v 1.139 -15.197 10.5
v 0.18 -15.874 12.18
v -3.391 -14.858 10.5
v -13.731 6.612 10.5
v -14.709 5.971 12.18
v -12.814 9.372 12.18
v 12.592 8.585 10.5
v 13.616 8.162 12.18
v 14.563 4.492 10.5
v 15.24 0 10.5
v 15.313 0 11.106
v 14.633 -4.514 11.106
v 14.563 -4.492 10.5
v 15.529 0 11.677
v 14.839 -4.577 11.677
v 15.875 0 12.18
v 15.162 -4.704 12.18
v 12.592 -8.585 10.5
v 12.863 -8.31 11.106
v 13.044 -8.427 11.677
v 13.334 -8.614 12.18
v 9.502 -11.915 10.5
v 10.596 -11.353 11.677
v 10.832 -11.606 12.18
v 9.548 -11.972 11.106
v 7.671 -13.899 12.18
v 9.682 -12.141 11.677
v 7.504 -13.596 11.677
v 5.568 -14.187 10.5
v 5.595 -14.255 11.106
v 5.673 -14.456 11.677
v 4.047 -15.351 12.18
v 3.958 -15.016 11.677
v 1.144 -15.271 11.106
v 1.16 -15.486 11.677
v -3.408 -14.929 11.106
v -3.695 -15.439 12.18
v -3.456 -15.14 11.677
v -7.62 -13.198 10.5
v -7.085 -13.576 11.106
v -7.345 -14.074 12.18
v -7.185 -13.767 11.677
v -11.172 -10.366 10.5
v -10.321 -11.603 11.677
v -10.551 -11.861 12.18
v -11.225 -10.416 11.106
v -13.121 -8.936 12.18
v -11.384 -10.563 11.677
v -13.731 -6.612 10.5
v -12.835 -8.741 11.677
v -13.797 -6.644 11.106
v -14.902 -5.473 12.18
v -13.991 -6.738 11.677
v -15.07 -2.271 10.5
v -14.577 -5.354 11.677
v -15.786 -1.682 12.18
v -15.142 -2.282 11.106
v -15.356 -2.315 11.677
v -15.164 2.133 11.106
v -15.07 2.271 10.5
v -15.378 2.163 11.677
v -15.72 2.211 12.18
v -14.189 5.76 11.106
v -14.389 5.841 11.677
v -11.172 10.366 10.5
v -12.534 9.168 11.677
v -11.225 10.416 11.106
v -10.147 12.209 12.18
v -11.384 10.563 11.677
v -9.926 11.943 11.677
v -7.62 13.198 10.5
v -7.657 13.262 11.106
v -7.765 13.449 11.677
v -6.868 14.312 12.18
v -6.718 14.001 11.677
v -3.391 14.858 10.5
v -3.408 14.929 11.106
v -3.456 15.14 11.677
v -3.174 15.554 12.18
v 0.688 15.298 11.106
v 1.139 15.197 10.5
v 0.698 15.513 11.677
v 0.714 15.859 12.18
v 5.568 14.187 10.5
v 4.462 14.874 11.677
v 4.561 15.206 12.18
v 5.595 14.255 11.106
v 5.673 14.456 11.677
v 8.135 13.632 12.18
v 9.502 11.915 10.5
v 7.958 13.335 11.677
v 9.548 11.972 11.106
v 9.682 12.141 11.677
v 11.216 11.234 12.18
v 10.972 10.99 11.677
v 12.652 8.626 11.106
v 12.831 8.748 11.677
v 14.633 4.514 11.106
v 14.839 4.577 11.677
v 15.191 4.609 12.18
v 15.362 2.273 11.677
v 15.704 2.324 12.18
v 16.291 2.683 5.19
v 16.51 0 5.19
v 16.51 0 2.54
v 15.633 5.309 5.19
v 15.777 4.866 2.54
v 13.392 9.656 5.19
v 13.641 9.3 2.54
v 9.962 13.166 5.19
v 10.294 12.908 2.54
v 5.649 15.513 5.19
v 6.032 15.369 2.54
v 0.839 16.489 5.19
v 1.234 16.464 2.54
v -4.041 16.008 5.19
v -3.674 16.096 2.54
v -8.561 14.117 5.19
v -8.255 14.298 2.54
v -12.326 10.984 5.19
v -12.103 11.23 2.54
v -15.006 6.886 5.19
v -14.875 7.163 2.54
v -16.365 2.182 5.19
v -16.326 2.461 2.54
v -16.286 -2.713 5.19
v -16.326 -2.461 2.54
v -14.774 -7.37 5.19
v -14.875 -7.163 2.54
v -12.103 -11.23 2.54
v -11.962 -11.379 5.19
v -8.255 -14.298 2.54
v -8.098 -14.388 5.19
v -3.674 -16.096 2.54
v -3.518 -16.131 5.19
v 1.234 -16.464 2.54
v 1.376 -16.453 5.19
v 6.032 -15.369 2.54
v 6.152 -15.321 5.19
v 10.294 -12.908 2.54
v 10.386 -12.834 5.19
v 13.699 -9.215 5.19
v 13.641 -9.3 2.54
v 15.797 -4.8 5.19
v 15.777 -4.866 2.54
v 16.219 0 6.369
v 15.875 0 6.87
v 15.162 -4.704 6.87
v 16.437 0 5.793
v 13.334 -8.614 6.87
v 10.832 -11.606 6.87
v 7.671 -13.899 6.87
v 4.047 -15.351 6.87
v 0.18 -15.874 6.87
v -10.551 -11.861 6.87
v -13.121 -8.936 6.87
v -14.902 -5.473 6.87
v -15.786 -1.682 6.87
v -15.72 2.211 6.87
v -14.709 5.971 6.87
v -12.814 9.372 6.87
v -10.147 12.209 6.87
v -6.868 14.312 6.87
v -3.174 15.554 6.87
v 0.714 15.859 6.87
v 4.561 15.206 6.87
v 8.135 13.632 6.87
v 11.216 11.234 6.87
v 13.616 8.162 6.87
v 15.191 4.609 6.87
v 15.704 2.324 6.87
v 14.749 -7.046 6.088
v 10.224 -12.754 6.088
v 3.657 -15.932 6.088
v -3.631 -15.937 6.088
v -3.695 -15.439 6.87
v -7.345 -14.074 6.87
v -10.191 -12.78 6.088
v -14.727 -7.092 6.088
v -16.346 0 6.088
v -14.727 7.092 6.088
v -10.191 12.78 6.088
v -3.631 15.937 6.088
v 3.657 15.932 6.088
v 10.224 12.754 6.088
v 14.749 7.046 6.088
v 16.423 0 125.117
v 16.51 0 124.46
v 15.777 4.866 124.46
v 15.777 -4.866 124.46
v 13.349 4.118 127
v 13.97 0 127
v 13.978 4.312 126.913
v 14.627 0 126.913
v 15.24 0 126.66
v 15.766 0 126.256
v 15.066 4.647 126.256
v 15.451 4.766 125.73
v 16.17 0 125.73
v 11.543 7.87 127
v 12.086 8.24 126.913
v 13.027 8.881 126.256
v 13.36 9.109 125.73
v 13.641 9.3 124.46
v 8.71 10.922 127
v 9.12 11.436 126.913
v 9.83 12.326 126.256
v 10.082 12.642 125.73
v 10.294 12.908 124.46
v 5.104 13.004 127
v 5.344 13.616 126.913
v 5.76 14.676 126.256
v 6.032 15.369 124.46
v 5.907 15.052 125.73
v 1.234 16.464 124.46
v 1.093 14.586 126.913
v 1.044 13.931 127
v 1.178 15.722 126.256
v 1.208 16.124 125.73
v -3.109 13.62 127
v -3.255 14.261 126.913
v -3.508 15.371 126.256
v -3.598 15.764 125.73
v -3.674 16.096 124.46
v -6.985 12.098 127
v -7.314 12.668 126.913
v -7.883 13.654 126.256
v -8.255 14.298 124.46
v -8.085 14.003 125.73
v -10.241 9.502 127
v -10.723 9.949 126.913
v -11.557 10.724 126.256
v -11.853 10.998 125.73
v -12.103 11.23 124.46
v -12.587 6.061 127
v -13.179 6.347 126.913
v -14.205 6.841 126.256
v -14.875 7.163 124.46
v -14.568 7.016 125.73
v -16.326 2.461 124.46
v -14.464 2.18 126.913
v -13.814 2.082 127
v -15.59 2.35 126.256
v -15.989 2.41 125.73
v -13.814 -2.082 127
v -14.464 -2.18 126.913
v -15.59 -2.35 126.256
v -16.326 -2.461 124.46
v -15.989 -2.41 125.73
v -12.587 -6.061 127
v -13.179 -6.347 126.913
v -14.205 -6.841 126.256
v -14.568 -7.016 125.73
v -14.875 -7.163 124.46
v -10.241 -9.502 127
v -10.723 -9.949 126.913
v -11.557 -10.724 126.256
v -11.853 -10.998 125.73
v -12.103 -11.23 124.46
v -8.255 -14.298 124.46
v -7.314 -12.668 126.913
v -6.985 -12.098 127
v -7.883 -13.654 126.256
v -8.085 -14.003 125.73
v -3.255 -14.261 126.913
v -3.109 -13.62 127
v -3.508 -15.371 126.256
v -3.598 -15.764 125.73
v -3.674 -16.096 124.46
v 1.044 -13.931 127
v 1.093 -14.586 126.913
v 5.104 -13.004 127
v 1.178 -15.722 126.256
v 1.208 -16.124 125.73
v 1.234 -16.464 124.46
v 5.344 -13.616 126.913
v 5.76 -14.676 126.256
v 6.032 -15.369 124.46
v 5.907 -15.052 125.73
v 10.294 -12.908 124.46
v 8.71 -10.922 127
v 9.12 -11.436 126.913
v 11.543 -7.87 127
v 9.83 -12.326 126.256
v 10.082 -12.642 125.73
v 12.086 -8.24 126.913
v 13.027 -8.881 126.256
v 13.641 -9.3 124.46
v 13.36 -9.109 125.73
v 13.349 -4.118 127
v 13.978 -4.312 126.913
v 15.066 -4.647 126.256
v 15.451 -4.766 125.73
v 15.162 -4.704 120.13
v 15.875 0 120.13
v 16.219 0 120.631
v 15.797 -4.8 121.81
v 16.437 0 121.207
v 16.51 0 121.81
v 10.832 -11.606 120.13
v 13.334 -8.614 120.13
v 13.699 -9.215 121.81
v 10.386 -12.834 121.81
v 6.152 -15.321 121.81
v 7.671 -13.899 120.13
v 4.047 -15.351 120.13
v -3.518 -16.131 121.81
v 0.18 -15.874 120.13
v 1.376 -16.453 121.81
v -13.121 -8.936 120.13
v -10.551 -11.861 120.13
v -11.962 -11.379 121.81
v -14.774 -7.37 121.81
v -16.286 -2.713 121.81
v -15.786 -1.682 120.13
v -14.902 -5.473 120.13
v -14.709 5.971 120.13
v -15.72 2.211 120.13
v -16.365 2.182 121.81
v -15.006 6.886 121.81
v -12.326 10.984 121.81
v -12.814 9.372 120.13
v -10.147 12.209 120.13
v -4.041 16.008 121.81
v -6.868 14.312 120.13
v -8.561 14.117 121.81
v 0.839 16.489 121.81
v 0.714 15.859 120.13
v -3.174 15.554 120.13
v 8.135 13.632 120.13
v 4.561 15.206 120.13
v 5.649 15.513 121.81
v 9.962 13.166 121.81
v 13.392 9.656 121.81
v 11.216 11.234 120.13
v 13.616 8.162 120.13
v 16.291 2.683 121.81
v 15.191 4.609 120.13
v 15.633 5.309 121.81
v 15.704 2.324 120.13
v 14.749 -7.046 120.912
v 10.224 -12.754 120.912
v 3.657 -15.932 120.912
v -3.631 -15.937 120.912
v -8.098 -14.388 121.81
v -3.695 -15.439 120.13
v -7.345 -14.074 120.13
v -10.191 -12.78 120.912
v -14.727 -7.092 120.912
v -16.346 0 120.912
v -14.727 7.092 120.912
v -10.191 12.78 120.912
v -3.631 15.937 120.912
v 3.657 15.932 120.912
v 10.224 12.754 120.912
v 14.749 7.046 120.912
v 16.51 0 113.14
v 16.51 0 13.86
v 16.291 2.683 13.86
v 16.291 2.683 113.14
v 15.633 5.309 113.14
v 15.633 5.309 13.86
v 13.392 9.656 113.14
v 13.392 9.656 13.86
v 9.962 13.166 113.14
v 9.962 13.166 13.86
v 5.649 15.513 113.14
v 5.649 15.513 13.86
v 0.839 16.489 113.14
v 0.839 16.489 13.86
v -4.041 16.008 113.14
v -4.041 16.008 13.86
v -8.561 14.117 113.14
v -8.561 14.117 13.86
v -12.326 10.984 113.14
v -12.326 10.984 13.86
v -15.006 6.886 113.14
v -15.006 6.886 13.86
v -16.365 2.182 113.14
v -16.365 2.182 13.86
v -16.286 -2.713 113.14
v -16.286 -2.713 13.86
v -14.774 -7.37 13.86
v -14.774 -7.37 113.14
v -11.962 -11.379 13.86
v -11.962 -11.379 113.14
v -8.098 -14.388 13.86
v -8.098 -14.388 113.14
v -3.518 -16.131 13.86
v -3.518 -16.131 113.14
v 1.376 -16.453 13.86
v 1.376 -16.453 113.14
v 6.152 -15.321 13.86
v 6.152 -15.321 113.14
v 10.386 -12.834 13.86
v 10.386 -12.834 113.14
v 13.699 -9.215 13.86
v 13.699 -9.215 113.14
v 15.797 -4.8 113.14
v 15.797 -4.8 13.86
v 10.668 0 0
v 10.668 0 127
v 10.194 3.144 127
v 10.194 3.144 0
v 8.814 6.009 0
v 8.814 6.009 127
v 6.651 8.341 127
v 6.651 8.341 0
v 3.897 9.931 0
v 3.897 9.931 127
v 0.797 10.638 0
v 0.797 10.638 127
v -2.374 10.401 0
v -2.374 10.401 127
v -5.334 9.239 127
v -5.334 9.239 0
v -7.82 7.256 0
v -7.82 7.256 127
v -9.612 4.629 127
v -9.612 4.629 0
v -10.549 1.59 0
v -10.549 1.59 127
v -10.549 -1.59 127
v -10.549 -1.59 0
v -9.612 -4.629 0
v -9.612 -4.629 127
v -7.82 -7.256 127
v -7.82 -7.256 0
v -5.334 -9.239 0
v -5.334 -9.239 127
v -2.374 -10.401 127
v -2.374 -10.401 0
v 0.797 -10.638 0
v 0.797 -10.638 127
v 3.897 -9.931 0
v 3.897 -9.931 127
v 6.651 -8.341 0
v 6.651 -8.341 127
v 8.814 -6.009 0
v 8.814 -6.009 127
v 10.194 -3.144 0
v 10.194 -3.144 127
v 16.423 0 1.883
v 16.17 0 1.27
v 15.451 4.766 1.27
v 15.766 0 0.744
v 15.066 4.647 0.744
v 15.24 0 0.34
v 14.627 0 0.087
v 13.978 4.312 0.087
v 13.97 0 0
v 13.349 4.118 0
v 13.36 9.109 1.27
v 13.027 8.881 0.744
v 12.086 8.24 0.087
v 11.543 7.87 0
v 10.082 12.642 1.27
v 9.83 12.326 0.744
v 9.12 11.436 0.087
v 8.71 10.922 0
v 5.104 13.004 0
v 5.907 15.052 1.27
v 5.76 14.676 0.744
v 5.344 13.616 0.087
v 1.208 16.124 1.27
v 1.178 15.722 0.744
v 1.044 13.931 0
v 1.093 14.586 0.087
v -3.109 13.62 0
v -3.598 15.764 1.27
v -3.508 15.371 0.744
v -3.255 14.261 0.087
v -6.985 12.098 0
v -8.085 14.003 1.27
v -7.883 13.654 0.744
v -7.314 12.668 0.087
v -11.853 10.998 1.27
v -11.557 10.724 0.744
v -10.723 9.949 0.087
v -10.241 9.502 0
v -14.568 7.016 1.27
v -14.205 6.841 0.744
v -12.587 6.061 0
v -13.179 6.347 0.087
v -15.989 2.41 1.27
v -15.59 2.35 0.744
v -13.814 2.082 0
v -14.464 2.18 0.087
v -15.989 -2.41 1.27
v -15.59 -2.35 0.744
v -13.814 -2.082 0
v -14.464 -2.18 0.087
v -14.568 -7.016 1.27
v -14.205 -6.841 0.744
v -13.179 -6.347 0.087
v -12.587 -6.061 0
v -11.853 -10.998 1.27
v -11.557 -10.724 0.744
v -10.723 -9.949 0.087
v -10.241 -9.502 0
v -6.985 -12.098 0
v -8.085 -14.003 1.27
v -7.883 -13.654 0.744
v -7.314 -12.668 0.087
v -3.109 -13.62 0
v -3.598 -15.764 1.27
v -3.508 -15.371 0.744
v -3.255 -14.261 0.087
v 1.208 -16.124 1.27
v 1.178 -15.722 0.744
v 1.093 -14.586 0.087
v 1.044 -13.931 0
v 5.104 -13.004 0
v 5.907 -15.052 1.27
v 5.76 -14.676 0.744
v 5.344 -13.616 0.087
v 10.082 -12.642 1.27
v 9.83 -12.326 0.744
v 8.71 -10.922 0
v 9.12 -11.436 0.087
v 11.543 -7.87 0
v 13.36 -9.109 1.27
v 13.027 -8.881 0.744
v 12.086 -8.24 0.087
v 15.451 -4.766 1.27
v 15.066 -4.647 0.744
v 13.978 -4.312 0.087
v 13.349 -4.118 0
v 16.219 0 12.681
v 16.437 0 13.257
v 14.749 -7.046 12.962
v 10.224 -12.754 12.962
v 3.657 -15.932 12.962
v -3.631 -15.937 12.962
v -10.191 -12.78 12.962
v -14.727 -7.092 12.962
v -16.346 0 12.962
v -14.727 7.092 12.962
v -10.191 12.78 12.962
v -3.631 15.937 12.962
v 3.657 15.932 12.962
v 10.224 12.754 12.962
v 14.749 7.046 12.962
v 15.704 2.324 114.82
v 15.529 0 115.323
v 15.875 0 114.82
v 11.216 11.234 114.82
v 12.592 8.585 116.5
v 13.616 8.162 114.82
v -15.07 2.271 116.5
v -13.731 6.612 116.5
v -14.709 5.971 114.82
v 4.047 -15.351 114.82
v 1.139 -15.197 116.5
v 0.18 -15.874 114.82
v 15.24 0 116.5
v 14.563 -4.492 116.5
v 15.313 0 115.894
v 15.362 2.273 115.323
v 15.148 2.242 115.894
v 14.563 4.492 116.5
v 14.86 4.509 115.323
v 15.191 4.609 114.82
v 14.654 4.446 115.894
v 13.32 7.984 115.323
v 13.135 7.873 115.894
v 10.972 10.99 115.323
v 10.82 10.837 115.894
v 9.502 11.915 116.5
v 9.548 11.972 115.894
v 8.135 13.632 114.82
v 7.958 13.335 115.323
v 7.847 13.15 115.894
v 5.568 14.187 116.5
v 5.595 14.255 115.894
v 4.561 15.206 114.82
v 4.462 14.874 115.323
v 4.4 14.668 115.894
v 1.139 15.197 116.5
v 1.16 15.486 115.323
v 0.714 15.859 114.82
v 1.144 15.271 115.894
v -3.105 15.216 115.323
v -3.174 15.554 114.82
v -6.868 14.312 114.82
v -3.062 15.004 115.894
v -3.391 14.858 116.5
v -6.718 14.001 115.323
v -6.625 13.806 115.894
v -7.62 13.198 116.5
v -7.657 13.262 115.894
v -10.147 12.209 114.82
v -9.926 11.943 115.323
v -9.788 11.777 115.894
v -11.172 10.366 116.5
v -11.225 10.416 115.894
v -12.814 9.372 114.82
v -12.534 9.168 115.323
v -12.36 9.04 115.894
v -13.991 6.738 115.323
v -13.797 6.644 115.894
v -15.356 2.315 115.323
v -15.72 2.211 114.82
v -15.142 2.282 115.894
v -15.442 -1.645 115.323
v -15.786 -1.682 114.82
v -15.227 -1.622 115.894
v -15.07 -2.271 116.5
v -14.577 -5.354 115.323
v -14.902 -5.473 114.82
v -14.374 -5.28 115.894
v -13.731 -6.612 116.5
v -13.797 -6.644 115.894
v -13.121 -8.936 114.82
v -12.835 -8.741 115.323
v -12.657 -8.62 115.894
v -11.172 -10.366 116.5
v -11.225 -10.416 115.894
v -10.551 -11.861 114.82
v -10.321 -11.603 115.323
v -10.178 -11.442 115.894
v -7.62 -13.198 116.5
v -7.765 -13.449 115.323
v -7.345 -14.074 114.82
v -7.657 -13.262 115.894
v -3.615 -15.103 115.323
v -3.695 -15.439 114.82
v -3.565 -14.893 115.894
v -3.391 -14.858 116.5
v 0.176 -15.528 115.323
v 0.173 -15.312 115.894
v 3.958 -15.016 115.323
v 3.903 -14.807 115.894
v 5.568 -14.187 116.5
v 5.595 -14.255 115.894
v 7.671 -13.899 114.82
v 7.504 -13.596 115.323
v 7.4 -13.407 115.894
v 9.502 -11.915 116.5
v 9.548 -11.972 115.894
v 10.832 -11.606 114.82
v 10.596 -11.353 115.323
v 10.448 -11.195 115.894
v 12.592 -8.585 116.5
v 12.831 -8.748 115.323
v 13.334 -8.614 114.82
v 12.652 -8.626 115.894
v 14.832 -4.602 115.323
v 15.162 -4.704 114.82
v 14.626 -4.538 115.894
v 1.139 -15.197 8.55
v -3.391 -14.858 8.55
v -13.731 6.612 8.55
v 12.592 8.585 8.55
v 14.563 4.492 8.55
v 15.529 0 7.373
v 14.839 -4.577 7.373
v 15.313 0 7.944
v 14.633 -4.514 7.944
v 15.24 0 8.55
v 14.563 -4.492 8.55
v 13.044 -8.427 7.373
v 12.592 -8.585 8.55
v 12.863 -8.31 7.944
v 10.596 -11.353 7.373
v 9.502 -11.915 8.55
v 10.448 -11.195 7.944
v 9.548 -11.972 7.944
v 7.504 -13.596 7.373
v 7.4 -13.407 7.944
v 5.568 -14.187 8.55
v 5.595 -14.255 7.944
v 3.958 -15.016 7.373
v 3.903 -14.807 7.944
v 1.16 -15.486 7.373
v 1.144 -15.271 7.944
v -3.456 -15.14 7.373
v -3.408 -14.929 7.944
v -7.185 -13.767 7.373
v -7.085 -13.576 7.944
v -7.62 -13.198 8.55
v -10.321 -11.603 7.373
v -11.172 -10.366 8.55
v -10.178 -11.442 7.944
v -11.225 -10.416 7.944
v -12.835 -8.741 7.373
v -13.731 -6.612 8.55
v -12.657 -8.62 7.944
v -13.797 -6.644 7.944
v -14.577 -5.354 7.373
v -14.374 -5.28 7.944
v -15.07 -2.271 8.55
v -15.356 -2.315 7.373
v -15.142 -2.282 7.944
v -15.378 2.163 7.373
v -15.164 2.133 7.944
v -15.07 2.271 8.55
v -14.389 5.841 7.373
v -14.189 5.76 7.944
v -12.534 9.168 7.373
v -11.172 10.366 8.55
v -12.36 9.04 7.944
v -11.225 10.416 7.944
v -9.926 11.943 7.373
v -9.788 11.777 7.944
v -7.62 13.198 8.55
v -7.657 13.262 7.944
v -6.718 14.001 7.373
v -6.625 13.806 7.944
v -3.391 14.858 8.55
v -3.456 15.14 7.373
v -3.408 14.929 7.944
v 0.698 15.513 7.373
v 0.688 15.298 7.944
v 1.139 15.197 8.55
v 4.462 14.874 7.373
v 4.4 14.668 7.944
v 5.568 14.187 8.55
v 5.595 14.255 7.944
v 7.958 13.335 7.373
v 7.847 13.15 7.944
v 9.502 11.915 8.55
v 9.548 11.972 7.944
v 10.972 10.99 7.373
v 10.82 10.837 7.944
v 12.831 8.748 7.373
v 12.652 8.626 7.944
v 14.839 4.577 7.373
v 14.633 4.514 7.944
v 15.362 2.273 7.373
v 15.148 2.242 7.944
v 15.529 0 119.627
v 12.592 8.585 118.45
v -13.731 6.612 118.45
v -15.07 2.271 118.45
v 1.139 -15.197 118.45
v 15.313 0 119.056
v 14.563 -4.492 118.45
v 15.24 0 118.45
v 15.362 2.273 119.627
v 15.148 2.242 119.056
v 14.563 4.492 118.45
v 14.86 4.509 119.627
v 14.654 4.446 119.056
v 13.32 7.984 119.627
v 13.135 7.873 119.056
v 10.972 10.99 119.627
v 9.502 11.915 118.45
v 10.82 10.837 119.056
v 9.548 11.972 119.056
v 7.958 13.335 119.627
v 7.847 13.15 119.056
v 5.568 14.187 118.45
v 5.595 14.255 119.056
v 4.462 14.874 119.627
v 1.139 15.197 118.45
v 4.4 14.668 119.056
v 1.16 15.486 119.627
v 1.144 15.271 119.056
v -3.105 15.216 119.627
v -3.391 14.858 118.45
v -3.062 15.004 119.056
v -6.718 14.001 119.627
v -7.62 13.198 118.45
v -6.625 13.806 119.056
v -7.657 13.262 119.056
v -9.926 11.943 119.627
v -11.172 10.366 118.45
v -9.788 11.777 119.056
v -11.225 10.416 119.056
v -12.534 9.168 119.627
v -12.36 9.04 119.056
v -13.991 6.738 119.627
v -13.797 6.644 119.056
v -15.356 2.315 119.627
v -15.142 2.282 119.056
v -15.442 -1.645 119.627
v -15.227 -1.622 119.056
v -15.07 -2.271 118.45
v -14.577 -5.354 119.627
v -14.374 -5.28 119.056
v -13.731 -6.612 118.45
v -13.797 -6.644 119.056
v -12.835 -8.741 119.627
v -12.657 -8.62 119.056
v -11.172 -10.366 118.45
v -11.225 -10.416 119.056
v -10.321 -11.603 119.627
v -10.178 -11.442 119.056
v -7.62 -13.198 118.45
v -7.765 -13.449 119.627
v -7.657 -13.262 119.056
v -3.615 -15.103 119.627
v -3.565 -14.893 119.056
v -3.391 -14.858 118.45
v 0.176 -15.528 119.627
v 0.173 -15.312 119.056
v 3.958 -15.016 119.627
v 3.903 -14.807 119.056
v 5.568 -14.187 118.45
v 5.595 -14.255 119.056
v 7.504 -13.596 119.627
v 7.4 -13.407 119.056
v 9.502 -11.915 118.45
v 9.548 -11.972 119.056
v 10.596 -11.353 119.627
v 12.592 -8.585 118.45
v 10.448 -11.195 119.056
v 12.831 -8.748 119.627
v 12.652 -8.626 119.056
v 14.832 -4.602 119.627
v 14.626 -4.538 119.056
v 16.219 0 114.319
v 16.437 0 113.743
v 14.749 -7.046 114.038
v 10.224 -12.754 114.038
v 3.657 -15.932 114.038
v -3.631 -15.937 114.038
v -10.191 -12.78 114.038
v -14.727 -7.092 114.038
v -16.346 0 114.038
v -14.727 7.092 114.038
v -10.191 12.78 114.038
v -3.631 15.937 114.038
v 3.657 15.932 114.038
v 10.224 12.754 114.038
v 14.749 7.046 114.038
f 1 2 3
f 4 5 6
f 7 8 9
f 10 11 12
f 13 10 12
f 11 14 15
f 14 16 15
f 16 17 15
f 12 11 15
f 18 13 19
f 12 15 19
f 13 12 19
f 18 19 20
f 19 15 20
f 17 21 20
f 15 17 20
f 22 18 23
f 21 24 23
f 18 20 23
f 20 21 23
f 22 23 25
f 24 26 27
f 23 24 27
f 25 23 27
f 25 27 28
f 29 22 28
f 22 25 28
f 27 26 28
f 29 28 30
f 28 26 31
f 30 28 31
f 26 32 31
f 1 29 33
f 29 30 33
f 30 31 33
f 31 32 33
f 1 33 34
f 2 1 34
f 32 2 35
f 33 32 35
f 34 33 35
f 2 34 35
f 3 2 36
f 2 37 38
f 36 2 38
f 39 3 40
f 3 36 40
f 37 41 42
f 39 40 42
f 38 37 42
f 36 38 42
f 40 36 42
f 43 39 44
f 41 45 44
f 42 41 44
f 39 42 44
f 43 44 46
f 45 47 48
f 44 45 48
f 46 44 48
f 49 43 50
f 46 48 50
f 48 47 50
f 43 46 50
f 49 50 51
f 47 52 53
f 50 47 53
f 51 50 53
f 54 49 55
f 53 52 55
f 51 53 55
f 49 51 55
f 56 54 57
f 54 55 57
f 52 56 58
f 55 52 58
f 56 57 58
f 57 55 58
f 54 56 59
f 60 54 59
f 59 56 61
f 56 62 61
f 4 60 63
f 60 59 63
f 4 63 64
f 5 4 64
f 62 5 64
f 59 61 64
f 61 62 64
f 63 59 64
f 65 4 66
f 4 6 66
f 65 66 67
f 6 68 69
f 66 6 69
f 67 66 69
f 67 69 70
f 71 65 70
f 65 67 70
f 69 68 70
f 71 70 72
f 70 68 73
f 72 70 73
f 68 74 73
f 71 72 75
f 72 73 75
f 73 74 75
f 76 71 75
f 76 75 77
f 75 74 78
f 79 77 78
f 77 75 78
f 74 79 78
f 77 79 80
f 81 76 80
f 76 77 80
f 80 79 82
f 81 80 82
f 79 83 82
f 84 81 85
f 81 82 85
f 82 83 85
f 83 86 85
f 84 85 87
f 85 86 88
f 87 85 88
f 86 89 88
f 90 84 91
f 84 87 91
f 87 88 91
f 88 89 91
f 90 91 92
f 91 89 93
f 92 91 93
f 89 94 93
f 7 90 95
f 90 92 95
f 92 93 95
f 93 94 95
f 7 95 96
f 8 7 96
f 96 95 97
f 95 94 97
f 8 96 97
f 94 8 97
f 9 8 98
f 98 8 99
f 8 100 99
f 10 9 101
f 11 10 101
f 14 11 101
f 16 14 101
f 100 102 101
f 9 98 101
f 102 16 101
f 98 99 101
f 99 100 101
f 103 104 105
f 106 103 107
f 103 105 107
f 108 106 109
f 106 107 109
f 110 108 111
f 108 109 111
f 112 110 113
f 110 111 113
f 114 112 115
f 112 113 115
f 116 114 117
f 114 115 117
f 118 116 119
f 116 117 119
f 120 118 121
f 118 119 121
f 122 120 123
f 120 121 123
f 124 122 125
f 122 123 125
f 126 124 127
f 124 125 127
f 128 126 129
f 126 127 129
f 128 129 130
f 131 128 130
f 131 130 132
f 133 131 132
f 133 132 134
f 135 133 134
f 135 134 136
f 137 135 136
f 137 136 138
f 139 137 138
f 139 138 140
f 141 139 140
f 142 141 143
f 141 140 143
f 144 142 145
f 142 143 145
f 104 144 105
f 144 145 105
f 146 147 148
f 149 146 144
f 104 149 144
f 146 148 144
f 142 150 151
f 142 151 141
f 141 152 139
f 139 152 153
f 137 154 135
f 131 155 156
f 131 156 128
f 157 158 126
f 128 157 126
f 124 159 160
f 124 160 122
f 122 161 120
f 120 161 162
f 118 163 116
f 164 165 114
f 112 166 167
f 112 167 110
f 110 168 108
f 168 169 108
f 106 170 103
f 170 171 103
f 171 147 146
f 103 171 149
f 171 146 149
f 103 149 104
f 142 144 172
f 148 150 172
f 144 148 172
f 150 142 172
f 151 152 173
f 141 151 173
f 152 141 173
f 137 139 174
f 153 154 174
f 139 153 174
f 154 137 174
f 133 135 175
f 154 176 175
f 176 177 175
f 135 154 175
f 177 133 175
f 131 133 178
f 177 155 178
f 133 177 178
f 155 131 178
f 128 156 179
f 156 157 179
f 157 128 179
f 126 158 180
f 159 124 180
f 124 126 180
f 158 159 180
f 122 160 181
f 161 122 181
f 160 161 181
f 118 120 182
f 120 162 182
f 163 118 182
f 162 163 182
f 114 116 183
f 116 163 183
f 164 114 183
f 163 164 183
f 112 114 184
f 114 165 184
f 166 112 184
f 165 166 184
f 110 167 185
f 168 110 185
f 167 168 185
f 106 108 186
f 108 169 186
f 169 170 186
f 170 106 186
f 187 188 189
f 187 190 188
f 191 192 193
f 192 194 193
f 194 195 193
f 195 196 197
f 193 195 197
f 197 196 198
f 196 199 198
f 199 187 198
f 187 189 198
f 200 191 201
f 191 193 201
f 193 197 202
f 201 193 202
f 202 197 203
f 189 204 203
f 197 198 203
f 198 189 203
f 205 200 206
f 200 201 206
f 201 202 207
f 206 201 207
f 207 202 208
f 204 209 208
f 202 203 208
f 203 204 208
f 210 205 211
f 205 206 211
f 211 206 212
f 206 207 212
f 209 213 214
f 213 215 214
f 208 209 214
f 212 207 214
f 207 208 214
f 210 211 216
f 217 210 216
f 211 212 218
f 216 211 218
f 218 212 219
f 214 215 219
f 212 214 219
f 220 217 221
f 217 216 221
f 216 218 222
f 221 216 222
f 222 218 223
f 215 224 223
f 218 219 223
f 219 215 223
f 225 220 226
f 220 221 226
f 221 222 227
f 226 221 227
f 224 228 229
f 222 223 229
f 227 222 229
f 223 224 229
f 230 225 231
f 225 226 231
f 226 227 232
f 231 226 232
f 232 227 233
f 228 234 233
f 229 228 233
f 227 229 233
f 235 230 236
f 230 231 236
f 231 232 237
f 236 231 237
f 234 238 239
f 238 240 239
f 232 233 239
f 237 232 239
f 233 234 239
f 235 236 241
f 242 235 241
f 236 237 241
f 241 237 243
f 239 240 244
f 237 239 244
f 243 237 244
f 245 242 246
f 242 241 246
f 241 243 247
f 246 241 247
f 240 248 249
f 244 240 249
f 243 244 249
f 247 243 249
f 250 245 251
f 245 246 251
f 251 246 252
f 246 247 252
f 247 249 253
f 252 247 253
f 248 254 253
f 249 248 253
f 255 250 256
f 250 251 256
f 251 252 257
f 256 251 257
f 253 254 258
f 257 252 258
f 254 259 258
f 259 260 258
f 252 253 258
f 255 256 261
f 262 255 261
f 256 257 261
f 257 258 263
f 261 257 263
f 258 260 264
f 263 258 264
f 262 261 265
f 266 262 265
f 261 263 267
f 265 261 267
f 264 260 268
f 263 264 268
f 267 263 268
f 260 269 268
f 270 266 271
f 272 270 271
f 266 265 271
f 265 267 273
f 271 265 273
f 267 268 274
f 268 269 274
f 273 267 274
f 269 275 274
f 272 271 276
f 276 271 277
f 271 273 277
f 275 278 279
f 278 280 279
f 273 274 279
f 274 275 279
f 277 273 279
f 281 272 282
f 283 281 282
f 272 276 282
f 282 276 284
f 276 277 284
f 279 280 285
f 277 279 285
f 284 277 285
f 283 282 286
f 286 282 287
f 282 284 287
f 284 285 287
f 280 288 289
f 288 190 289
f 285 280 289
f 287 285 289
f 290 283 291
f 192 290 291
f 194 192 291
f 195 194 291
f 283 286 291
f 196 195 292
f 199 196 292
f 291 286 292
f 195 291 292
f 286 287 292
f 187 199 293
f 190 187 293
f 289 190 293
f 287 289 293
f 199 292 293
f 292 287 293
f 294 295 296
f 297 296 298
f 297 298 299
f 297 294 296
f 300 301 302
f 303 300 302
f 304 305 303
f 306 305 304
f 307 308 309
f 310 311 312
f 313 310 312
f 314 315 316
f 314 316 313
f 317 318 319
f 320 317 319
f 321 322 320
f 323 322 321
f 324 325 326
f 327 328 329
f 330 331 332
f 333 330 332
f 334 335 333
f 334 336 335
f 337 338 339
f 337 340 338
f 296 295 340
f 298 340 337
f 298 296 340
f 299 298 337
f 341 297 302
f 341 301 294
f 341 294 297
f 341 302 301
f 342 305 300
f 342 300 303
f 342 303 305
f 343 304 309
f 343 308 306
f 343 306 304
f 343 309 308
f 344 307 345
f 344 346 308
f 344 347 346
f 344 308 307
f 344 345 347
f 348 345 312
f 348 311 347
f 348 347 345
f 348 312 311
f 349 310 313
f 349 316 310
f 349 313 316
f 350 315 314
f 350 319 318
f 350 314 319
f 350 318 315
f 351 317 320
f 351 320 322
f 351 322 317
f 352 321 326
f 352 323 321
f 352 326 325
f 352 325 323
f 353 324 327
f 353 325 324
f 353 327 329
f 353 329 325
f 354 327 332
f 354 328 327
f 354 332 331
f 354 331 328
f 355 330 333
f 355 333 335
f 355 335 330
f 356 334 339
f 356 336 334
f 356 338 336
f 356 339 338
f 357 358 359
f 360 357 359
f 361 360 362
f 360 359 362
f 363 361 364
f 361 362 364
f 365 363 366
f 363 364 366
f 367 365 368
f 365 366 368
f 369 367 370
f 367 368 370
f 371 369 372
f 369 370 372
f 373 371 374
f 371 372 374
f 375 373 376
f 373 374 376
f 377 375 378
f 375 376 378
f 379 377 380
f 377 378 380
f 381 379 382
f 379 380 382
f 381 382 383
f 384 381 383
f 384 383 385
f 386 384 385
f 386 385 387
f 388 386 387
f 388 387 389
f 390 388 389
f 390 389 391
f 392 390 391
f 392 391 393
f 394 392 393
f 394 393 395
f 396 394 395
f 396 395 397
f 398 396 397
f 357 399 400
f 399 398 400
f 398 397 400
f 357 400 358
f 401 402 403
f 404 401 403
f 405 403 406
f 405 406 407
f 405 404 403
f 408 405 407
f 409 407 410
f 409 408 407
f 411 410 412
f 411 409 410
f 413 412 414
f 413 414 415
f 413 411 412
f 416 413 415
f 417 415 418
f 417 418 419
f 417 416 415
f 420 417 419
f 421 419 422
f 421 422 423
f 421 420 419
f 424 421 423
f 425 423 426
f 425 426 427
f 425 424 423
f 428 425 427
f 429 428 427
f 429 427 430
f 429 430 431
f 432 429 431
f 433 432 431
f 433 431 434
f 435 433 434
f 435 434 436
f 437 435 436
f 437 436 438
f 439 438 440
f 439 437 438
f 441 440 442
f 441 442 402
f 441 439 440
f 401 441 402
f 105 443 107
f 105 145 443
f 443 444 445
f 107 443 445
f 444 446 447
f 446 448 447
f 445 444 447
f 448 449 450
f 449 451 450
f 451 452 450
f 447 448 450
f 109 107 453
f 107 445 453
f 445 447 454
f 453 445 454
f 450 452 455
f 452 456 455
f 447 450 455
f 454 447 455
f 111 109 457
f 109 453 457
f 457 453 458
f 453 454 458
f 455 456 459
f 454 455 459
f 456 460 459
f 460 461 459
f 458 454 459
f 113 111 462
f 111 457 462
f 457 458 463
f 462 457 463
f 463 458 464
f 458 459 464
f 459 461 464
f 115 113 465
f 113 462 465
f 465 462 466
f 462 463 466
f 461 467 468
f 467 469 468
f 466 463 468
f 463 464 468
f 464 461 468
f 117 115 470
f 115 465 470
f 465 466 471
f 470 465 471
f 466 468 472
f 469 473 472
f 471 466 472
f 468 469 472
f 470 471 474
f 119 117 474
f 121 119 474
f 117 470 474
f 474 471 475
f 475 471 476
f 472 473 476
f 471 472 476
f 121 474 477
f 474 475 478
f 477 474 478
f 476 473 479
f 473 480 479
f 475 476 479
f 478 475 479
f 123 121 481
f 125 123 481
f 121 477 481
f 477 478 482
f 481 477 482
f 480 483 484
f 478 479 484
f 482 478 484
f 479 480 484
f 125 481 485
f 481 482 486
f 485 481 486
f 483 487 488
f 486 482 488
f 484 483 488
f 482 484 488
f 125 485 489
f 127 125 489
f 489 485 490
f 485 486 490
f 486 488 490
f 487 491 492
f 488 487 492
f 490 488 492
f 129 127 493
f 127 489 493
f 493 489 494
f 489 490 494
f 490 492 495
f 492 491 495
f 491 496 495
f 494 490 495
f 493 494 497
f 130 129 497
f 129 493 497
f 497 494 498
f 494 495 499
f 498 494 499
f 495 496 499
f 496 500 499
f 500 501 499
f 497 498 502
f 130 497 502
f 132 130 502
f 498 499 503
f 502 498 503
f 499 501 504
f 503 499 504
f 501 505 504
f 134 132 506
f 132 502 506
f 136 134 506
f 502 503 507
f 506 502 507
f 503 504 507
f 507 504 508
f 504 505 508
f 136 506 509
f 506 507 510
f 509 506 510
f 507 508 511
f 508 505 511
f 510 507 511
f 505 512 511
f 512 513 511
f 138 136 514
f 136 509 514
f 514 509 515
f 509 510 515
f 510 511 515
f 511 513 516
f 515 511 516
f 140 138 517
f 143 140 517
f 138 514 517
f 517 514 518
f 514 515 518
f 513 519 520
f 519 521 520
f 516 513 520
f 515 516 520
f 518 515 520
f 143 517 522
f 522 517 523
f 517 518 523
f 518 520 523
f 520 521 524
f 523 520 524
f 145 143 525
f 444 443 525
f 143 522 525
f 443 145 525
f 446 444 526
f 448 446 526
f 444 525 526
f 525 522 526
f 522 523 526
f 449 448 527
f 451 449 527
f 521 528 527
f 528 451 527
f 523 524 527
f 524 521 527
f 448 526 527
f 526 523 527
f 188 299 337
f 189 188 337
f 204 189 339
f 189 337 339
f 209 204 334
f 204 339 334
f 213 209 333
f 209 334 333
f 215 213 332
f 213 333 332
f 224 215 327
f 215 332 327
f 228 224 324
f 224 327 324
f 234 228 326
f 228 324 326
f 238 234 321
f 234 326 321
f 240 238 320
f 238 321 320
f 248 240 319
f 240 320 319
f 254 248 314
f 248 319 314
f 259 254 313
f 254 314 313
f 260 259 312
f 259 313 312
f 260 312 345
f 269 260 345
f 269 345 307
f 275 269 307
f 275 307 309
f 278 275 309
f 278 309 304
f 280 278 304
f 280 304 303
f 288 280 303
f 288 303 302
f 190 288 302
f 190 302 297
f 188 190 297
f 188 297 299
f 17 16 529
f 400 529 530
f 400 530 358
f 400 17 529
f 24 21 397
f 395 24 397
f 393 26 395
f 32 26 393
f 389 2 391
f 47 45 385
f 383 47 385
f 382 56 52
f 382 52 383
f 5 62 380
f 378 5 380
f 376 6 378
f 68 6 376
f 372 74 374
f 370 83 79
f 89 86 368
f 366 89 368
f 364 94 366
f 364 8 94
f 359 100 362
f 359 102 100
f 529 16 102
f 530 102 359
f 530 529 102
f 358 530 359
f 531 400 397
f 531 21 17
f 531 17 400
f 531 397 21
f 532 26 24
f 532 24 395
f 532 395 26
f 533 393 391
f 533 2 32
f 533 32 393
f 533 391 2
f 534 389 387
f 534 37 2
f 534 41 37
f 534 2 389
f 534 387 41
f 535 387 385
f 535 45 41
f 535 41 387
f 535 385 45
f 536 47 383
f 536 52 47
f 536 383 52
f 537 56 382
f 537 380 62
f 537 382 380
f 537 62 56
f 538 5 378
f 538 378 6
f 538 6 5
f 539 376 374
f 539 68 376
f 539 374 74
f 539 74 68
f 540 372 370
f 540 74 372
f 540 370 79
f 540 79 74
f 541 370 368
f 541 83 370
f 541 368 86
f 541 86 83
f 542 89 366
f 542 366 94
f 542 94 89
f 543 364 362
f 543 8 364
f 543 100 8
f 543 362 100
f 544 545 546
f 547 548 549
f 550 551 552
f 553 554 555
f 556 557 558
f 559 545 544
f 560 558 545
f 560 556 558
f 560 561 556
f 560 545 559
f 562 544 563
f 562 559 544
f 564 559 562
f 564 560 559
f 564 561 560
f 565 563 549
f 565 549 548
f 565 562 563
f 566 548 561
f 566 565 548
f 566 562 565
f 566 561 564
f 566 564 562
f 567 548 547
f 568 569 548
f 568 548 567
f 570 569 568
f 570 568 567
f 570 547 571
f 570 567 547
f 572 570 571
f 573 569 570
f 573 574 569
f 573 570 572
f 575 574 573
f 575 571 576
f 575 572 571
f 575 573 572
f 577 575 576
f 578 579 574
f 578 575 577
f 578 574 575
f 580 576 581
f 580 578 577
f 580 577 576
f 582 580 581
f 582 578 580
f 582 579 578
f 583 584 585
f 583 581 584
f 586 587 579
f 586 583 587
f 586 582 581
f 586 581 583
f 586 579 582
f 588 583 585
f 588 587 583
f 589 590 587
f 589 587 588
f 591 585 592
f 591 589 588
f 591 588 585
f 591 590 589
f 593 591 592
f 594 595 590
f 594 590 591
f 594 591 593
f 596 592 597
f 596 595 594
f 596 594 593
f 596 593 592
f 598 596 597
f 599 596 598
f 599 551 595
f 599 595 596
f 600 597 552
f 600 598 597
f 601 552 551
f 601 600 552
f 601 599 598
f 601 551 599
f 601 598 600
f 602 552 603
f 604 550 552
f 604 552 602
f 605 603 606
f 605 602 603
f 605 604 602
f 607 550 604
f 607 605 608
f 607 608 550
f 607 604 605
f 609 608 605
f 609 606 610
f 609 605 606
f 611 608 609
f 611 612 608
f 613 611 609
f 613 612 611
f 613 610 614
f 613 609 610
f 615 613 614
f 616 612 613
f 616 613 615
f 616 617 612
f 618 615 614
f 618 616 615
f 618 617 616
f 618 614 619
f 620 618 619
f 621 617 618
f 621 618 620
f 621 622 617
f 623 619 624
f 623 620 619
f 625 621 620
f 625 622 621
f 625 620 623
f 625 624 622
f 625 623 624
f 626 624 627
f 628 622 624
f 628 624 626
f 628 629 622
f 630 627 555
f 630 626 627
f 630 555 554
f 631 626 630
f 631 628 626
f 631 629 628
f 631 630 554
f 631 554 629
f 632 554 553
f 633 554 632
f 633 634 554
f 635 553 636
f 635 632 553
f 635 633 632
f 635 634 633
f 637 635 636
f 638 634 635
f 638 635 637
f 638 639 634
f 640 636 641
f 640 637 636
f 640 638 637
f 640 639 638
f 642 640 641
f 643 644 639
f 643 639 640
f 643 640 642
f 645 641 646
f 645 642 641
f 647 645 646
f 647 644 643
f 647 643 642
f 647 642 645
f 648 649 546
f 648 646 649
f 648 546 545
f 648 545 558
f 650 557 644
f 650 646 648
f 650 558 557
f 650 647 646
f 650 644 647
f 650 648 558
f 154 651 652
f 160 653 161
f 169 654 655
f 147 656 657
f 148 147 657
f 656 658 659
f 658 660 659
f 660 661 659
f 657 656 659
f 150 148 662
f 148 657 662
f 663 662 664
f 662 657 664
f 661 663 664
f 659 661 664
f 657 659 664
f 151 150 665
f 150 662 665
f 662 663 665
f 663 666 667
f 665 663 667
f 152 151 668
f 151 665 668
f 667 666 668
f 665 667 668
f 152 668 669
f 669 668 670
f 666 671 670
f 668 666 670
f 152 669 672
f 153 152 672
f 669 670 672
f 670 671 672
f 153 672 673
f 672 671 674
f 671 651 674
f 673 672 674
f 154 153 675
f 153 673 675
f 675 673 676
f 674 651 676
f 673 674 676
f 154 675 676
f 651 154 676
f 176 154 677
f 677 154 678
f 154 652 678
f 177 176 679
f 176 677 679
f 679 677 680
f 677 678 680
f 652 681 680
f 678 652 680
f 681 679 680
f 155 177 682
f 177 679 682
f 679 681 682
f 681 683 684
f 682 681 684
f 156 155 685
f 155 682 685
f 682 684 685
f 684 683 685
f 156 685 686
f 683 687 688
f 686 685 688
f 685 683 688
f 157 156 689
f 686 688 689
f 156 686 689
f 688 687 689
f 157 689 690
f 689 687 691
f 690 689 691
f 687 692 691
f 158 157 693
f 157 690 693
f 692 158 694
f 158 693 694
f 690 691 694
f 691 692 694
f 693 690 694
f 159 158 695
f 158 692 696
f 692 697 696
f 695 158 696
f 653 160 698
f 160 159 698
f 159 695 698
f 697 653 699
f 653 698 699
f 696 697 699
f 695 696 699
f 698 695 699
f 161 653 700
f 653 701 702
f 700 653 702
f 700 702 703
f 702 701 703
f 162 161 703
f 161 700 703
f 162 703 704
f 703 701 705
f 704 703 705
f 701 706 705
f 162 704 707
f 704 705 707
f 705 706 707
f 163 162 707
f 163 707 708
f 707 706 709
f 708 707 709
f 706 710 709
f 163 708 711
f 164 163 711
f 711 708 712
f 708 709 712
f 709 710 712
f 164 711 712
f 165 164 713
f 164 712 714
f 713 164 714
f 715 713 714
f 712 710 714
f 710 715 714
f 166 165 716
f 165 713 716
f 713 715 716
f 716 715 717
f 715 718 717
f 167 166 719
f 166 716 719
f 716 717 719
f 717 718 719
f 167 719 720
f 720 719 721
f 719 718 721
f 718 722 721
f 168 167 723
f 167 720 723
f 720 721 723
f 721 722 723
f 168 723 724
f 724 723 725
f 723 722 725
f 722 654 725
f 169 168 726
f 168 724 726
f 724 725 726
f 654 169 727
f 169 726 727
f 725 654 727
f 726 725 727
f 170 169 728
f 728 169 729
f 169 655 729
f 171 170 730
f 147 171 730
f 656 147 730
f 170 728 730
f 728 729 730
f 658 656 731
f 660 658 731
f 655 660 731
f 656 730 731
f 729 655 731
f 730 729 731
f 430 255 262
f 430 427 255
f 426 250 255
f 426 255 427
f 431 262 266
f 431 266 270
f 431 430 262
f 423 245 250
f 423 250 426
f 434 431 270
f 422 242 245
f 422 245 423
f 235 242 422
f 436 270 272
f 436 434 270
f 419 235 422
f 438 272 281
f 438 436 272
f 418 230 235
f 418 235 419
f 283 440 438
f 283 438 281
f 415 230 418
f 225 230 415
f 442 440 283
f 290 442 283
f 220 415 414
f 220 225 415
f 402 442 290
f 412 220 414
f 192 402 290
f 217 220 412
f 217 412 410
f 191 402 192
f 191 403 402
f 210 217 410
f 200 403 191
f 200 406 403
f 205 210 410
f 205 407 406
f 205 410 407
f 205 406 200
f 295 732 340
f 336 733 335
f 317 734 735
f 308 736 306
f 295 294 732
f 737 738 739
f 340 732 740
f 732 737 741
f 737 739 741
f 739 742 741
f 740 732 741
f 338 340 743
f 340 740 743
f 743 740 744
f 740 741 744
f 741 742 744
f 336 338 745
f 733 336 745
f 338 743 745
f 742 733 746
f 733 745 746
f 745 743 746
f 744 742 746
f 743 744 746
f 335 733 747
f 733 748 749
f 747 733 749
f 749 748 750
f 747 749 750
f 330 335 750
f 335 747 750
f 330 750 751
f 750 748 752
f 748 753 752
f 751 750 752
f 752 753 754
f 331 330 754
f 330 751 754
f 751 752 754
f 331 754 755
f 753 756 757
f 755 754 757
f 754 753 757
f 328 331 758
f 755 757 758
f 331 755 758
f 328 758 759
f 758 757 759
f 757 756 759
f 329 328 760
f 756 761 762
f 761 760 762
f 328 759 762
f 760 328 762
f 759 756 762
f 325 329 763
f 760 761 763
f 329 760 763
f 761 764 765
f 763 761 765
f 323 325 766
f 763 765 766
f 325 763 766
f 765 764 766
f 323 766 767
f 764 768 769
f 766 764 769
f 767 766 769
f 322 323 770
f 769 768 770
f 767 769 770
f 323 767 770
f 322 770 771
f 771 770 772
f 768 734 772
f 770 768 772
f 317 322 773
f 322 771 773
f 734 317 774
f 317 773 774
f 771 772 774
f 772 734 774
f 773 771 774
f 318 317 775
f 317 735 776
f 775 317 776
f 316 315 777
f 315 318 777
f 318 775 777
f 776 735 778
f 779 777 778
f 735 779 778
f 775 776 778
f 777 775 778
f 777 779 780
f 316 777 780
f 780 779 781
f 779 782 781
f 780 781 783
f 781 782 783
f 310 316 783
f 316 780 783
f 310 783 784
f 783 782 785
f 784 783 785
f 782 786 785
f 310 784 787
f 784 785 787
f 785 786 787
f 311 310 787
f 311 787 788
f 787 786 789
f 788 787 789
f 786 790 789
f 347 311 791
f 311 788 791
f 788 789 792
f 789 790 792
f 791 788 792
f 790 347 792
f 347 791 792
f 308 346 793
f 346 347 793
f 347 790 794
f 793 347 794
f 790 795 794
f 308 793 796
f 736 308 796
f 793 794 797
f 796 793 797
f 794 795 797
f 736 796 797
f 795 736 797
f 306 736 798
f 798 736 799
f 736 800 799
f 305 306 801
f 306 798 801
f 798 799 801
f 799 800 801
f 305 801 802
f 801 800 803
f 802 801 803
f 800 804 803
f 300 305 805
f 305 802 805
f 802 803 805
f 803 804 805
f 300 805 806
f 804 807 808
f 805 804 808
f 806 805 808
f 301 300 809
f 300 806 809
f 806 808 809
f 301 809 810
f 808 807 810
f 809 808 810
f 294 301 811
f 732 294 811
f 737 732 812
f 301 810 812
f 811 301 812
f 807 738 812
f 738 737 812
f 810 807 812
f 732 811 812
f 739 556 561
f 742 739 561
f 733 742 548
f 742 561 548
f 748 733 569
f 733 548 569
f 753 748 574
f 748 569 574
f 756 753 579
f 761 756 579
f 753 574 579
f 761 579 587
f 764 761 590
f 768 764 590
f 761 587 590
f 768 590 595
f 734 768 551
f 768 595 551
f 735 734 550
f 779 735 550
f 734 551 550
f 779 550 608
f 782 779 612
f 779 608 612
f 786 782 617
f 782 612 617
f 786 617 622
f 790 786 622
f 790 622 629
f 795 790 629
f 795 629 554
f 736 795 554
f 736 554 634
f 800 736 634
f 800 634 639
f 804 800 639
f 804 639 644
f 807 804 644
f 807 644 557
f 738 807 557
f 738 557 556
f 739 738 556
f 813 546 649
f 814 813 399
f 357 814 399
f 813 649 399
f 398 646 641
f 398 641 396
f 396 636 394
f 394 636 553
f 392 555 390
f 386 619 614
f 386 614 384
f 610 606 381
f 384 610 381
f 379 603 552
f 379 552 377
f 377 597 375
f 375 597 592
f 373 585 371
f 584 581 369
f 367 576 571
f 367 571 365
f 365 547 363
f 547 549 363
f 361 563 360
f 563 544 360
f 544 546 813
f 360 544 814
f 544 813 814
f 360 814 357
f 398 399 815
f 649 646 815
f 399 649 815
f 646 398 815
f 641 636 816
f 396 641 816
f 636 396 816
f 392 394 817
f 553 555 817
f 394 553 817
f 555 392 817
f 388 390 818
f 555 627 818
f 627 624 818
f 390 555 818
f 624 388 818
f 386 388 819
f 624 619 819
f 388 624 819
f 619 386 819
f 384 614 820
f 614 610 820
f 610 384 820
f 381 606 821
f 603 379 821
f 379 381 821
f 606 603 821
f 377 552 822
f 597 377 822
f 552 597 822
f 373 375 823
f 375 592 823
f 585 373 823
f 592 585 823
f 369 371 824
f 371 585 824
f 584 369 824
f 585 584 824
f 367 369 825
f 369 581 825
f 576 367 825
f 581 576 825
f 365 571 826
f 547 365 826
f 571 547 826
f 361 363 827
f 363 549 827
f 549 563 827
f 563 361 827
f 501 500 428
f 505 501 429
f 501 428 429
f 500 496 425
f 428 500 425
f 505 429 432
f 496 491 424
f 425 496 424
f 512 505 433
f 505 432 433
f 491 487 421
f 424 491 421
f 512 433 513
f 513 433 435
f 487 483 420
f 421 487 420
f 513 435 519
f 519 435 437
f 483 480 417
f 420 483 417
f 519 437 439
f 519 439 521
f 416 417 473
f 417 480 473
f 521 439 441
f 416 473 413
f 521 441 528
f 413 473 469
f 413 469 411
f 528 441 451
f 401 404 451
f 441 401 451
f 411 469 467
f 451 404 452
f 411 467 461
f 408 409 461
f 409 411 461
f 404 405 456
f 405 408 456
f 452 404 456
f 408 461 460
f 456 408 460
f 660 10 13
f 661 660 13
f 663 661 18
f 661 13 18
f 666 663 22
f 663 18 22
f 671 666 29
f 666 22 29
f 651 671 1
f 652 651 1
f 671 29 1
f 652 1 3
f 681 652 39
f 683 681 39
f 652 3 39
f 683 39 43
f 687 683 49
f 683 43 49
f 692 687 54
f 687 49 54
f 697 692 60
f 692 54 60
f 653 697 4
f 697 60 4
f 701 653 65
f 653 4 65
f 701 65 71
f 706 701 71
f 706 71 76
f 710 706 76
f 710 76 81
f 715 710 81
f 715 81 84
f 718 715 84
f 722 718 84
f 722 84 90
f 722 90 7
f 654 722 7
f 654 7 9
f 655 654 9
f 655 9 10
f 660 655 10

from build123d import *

# Parameters (mm, degrees)
F0_R     = 16.51
F0_R_2   = 10.668
F1_DEPTH = 127
F3_R     = 16.9570806309
F3_R_2   = 15.24
F4_DEPTH = 6.35
F6_R     = 19.4483101308
F6_R_2   = 15.24
F7_DEPTH = 6.35
F8_R     = 2.54
F11_R    = 2.54
F14_R    = 2.54


# Not quite as in the source:
# - a fillet or chamfer that OpenCascade refuses, or shapes differently, is made with other operations: its cross-section is extruded or revolved along the edge and cut away or added


with BuildPart() as f1:
    # F0 (on Top) → F1 (new body)
    with BuildSketch(Plane.XY):
        Circle(F0_R)
        Circle(F0_R_2, mode=Mode.SUBTRACT)
    extrude(amount=F1_DEPTH)

    # F3 (on offset) → F4 (cut)
    with BuildSketch(Plane.XY.offset(114.3)):
        Circle(F3_R)
        Circle(F3_R_2, mode=Mode.SUBTRACT)
    extrude(amount=F4_DEPTH, mode=Mode.SUBTRACT)

    # F6 (on offset) → F7 (cut)
    with BuildSketch(Plane(origin=(0, 0, 12.7), x_dir=(1, 0, 0), z_dir=(0, 0, -1))):
        Circle(F6_R)
        Circle(F6_R_2, mode=Mode.SUBTRACT)
    extrude(amount=F7_DEPTH, mode=Mode.SUBTRACT)

    # F8
    f8_edges = [f1.edges().sort_by_distance(p)[0] for p in [
        (-16.51, 0, 0),
    ]]
    fillet(f8_edges, radius=F8_R)

    # F9: fillet of radius 2.54 on 1 edges, made by hand

    # F9_s1 → F9_t2 (revolve)
    with BuildSketch(Plane.XZ):
        with BuildLine():
            ThreePointArc((15.24, 10.5002954744), (15.5802954744, 11.7702954744), (16.51, 12.7))
            Line((16.51, 12.7), (15.24, 12.7))
            Line((15.24, 12.7), (15.24, 10.5002954744))
        make_face()
    revolve(axis=Axis((0, 0, 12.7), (0, 0, -1)))

    # F10: fillet of radius 2.54 on 1 edges, made by hand

    # F10_s1 → F10_t2 (revolve)
    with BuildSketch(Plane.XZ):
        with BuildLine():
            ThreePointArc((16.51, 6.35), (15.5802954744, 7.2797045256), (15.24, 8.5497045256))
            Line((15.24, 8.5497045256), (15.24, 6.35))
            Line((15.24, 6.35), (16.51, 6.35))
        make_face()
    revolve(axis=Axis((0, 0, 6.35), (0, 0, -1)))

    # F11
    f11_edges = [f1.edges().sort_by_distance(p)[0] for p in [
        (-16.51, 0, 12.7),
        (-16.51, 0, 6.35),
    ]]
    fillet(f11_edges, radius=F11_R)

    # F12: fillet of radius 2.54 on 2 edges, made by hand

    # F12_s1 → F12_t2 (revolve)
    with BuildSketch(Plane.XZ):
        with BuildLine():
            ThreePointArc((16.51, 114.3), (15.5802954744, 115.2297045256), (15.24, 116.4997045256))
            Line((15.24, 116.4997045256), (15.24, 114.3))
            Line((15.24, 114.3), (16.51, 114.3))
        make_face()
    revolve(axis=Axis((0, 0, 114.3), (0, 0, 1)))

    # F12_s3 → F12_t4 (revolve, cut)
    with BuildSketch(Plane.XZ):
        with BuildLine():
            ThreePointArc((13.97, 127), (15.7660512242, 126.2560512242), (16.51, 124.46))
            Line((16.51, 124.46), (16.51, 127))
            Line((16.51, 127), (13.97, 127))
        make_face()
    revolve(axis=Axis((0, 0, 127), (0, 0, 1)), mode=Mode.SUBTRACT)

    # F13: fillet of radius 2.54 on 1 edges, made by hand

    # F13_s1 → F13_t2 (revolve)
    with BuildSketch(Plane.XZ):
        with BuildLine():
            ThreePointArc((16.51, 120.65), (15.5802954744, 119.7202954744), (15.24, 118.4502954744))
            Line((15.24, 118.4502954744), (15.24, 120.65))
            Line((15.24, 120.65), (16.51, 120.65))
        make_face()
    revolve(axis=Axis((0, 0, 120.65), (0, 0, 1)))

    # F14
    f14_edges = [f1.edges().sort_by_distance(p)[0] for p in [
        (-16.51, 0, 120.65),
        (-16.51, 0, 114.3),
    ]]
    fillet(f14_edges, radius=F14_R)


solid = f1.part
